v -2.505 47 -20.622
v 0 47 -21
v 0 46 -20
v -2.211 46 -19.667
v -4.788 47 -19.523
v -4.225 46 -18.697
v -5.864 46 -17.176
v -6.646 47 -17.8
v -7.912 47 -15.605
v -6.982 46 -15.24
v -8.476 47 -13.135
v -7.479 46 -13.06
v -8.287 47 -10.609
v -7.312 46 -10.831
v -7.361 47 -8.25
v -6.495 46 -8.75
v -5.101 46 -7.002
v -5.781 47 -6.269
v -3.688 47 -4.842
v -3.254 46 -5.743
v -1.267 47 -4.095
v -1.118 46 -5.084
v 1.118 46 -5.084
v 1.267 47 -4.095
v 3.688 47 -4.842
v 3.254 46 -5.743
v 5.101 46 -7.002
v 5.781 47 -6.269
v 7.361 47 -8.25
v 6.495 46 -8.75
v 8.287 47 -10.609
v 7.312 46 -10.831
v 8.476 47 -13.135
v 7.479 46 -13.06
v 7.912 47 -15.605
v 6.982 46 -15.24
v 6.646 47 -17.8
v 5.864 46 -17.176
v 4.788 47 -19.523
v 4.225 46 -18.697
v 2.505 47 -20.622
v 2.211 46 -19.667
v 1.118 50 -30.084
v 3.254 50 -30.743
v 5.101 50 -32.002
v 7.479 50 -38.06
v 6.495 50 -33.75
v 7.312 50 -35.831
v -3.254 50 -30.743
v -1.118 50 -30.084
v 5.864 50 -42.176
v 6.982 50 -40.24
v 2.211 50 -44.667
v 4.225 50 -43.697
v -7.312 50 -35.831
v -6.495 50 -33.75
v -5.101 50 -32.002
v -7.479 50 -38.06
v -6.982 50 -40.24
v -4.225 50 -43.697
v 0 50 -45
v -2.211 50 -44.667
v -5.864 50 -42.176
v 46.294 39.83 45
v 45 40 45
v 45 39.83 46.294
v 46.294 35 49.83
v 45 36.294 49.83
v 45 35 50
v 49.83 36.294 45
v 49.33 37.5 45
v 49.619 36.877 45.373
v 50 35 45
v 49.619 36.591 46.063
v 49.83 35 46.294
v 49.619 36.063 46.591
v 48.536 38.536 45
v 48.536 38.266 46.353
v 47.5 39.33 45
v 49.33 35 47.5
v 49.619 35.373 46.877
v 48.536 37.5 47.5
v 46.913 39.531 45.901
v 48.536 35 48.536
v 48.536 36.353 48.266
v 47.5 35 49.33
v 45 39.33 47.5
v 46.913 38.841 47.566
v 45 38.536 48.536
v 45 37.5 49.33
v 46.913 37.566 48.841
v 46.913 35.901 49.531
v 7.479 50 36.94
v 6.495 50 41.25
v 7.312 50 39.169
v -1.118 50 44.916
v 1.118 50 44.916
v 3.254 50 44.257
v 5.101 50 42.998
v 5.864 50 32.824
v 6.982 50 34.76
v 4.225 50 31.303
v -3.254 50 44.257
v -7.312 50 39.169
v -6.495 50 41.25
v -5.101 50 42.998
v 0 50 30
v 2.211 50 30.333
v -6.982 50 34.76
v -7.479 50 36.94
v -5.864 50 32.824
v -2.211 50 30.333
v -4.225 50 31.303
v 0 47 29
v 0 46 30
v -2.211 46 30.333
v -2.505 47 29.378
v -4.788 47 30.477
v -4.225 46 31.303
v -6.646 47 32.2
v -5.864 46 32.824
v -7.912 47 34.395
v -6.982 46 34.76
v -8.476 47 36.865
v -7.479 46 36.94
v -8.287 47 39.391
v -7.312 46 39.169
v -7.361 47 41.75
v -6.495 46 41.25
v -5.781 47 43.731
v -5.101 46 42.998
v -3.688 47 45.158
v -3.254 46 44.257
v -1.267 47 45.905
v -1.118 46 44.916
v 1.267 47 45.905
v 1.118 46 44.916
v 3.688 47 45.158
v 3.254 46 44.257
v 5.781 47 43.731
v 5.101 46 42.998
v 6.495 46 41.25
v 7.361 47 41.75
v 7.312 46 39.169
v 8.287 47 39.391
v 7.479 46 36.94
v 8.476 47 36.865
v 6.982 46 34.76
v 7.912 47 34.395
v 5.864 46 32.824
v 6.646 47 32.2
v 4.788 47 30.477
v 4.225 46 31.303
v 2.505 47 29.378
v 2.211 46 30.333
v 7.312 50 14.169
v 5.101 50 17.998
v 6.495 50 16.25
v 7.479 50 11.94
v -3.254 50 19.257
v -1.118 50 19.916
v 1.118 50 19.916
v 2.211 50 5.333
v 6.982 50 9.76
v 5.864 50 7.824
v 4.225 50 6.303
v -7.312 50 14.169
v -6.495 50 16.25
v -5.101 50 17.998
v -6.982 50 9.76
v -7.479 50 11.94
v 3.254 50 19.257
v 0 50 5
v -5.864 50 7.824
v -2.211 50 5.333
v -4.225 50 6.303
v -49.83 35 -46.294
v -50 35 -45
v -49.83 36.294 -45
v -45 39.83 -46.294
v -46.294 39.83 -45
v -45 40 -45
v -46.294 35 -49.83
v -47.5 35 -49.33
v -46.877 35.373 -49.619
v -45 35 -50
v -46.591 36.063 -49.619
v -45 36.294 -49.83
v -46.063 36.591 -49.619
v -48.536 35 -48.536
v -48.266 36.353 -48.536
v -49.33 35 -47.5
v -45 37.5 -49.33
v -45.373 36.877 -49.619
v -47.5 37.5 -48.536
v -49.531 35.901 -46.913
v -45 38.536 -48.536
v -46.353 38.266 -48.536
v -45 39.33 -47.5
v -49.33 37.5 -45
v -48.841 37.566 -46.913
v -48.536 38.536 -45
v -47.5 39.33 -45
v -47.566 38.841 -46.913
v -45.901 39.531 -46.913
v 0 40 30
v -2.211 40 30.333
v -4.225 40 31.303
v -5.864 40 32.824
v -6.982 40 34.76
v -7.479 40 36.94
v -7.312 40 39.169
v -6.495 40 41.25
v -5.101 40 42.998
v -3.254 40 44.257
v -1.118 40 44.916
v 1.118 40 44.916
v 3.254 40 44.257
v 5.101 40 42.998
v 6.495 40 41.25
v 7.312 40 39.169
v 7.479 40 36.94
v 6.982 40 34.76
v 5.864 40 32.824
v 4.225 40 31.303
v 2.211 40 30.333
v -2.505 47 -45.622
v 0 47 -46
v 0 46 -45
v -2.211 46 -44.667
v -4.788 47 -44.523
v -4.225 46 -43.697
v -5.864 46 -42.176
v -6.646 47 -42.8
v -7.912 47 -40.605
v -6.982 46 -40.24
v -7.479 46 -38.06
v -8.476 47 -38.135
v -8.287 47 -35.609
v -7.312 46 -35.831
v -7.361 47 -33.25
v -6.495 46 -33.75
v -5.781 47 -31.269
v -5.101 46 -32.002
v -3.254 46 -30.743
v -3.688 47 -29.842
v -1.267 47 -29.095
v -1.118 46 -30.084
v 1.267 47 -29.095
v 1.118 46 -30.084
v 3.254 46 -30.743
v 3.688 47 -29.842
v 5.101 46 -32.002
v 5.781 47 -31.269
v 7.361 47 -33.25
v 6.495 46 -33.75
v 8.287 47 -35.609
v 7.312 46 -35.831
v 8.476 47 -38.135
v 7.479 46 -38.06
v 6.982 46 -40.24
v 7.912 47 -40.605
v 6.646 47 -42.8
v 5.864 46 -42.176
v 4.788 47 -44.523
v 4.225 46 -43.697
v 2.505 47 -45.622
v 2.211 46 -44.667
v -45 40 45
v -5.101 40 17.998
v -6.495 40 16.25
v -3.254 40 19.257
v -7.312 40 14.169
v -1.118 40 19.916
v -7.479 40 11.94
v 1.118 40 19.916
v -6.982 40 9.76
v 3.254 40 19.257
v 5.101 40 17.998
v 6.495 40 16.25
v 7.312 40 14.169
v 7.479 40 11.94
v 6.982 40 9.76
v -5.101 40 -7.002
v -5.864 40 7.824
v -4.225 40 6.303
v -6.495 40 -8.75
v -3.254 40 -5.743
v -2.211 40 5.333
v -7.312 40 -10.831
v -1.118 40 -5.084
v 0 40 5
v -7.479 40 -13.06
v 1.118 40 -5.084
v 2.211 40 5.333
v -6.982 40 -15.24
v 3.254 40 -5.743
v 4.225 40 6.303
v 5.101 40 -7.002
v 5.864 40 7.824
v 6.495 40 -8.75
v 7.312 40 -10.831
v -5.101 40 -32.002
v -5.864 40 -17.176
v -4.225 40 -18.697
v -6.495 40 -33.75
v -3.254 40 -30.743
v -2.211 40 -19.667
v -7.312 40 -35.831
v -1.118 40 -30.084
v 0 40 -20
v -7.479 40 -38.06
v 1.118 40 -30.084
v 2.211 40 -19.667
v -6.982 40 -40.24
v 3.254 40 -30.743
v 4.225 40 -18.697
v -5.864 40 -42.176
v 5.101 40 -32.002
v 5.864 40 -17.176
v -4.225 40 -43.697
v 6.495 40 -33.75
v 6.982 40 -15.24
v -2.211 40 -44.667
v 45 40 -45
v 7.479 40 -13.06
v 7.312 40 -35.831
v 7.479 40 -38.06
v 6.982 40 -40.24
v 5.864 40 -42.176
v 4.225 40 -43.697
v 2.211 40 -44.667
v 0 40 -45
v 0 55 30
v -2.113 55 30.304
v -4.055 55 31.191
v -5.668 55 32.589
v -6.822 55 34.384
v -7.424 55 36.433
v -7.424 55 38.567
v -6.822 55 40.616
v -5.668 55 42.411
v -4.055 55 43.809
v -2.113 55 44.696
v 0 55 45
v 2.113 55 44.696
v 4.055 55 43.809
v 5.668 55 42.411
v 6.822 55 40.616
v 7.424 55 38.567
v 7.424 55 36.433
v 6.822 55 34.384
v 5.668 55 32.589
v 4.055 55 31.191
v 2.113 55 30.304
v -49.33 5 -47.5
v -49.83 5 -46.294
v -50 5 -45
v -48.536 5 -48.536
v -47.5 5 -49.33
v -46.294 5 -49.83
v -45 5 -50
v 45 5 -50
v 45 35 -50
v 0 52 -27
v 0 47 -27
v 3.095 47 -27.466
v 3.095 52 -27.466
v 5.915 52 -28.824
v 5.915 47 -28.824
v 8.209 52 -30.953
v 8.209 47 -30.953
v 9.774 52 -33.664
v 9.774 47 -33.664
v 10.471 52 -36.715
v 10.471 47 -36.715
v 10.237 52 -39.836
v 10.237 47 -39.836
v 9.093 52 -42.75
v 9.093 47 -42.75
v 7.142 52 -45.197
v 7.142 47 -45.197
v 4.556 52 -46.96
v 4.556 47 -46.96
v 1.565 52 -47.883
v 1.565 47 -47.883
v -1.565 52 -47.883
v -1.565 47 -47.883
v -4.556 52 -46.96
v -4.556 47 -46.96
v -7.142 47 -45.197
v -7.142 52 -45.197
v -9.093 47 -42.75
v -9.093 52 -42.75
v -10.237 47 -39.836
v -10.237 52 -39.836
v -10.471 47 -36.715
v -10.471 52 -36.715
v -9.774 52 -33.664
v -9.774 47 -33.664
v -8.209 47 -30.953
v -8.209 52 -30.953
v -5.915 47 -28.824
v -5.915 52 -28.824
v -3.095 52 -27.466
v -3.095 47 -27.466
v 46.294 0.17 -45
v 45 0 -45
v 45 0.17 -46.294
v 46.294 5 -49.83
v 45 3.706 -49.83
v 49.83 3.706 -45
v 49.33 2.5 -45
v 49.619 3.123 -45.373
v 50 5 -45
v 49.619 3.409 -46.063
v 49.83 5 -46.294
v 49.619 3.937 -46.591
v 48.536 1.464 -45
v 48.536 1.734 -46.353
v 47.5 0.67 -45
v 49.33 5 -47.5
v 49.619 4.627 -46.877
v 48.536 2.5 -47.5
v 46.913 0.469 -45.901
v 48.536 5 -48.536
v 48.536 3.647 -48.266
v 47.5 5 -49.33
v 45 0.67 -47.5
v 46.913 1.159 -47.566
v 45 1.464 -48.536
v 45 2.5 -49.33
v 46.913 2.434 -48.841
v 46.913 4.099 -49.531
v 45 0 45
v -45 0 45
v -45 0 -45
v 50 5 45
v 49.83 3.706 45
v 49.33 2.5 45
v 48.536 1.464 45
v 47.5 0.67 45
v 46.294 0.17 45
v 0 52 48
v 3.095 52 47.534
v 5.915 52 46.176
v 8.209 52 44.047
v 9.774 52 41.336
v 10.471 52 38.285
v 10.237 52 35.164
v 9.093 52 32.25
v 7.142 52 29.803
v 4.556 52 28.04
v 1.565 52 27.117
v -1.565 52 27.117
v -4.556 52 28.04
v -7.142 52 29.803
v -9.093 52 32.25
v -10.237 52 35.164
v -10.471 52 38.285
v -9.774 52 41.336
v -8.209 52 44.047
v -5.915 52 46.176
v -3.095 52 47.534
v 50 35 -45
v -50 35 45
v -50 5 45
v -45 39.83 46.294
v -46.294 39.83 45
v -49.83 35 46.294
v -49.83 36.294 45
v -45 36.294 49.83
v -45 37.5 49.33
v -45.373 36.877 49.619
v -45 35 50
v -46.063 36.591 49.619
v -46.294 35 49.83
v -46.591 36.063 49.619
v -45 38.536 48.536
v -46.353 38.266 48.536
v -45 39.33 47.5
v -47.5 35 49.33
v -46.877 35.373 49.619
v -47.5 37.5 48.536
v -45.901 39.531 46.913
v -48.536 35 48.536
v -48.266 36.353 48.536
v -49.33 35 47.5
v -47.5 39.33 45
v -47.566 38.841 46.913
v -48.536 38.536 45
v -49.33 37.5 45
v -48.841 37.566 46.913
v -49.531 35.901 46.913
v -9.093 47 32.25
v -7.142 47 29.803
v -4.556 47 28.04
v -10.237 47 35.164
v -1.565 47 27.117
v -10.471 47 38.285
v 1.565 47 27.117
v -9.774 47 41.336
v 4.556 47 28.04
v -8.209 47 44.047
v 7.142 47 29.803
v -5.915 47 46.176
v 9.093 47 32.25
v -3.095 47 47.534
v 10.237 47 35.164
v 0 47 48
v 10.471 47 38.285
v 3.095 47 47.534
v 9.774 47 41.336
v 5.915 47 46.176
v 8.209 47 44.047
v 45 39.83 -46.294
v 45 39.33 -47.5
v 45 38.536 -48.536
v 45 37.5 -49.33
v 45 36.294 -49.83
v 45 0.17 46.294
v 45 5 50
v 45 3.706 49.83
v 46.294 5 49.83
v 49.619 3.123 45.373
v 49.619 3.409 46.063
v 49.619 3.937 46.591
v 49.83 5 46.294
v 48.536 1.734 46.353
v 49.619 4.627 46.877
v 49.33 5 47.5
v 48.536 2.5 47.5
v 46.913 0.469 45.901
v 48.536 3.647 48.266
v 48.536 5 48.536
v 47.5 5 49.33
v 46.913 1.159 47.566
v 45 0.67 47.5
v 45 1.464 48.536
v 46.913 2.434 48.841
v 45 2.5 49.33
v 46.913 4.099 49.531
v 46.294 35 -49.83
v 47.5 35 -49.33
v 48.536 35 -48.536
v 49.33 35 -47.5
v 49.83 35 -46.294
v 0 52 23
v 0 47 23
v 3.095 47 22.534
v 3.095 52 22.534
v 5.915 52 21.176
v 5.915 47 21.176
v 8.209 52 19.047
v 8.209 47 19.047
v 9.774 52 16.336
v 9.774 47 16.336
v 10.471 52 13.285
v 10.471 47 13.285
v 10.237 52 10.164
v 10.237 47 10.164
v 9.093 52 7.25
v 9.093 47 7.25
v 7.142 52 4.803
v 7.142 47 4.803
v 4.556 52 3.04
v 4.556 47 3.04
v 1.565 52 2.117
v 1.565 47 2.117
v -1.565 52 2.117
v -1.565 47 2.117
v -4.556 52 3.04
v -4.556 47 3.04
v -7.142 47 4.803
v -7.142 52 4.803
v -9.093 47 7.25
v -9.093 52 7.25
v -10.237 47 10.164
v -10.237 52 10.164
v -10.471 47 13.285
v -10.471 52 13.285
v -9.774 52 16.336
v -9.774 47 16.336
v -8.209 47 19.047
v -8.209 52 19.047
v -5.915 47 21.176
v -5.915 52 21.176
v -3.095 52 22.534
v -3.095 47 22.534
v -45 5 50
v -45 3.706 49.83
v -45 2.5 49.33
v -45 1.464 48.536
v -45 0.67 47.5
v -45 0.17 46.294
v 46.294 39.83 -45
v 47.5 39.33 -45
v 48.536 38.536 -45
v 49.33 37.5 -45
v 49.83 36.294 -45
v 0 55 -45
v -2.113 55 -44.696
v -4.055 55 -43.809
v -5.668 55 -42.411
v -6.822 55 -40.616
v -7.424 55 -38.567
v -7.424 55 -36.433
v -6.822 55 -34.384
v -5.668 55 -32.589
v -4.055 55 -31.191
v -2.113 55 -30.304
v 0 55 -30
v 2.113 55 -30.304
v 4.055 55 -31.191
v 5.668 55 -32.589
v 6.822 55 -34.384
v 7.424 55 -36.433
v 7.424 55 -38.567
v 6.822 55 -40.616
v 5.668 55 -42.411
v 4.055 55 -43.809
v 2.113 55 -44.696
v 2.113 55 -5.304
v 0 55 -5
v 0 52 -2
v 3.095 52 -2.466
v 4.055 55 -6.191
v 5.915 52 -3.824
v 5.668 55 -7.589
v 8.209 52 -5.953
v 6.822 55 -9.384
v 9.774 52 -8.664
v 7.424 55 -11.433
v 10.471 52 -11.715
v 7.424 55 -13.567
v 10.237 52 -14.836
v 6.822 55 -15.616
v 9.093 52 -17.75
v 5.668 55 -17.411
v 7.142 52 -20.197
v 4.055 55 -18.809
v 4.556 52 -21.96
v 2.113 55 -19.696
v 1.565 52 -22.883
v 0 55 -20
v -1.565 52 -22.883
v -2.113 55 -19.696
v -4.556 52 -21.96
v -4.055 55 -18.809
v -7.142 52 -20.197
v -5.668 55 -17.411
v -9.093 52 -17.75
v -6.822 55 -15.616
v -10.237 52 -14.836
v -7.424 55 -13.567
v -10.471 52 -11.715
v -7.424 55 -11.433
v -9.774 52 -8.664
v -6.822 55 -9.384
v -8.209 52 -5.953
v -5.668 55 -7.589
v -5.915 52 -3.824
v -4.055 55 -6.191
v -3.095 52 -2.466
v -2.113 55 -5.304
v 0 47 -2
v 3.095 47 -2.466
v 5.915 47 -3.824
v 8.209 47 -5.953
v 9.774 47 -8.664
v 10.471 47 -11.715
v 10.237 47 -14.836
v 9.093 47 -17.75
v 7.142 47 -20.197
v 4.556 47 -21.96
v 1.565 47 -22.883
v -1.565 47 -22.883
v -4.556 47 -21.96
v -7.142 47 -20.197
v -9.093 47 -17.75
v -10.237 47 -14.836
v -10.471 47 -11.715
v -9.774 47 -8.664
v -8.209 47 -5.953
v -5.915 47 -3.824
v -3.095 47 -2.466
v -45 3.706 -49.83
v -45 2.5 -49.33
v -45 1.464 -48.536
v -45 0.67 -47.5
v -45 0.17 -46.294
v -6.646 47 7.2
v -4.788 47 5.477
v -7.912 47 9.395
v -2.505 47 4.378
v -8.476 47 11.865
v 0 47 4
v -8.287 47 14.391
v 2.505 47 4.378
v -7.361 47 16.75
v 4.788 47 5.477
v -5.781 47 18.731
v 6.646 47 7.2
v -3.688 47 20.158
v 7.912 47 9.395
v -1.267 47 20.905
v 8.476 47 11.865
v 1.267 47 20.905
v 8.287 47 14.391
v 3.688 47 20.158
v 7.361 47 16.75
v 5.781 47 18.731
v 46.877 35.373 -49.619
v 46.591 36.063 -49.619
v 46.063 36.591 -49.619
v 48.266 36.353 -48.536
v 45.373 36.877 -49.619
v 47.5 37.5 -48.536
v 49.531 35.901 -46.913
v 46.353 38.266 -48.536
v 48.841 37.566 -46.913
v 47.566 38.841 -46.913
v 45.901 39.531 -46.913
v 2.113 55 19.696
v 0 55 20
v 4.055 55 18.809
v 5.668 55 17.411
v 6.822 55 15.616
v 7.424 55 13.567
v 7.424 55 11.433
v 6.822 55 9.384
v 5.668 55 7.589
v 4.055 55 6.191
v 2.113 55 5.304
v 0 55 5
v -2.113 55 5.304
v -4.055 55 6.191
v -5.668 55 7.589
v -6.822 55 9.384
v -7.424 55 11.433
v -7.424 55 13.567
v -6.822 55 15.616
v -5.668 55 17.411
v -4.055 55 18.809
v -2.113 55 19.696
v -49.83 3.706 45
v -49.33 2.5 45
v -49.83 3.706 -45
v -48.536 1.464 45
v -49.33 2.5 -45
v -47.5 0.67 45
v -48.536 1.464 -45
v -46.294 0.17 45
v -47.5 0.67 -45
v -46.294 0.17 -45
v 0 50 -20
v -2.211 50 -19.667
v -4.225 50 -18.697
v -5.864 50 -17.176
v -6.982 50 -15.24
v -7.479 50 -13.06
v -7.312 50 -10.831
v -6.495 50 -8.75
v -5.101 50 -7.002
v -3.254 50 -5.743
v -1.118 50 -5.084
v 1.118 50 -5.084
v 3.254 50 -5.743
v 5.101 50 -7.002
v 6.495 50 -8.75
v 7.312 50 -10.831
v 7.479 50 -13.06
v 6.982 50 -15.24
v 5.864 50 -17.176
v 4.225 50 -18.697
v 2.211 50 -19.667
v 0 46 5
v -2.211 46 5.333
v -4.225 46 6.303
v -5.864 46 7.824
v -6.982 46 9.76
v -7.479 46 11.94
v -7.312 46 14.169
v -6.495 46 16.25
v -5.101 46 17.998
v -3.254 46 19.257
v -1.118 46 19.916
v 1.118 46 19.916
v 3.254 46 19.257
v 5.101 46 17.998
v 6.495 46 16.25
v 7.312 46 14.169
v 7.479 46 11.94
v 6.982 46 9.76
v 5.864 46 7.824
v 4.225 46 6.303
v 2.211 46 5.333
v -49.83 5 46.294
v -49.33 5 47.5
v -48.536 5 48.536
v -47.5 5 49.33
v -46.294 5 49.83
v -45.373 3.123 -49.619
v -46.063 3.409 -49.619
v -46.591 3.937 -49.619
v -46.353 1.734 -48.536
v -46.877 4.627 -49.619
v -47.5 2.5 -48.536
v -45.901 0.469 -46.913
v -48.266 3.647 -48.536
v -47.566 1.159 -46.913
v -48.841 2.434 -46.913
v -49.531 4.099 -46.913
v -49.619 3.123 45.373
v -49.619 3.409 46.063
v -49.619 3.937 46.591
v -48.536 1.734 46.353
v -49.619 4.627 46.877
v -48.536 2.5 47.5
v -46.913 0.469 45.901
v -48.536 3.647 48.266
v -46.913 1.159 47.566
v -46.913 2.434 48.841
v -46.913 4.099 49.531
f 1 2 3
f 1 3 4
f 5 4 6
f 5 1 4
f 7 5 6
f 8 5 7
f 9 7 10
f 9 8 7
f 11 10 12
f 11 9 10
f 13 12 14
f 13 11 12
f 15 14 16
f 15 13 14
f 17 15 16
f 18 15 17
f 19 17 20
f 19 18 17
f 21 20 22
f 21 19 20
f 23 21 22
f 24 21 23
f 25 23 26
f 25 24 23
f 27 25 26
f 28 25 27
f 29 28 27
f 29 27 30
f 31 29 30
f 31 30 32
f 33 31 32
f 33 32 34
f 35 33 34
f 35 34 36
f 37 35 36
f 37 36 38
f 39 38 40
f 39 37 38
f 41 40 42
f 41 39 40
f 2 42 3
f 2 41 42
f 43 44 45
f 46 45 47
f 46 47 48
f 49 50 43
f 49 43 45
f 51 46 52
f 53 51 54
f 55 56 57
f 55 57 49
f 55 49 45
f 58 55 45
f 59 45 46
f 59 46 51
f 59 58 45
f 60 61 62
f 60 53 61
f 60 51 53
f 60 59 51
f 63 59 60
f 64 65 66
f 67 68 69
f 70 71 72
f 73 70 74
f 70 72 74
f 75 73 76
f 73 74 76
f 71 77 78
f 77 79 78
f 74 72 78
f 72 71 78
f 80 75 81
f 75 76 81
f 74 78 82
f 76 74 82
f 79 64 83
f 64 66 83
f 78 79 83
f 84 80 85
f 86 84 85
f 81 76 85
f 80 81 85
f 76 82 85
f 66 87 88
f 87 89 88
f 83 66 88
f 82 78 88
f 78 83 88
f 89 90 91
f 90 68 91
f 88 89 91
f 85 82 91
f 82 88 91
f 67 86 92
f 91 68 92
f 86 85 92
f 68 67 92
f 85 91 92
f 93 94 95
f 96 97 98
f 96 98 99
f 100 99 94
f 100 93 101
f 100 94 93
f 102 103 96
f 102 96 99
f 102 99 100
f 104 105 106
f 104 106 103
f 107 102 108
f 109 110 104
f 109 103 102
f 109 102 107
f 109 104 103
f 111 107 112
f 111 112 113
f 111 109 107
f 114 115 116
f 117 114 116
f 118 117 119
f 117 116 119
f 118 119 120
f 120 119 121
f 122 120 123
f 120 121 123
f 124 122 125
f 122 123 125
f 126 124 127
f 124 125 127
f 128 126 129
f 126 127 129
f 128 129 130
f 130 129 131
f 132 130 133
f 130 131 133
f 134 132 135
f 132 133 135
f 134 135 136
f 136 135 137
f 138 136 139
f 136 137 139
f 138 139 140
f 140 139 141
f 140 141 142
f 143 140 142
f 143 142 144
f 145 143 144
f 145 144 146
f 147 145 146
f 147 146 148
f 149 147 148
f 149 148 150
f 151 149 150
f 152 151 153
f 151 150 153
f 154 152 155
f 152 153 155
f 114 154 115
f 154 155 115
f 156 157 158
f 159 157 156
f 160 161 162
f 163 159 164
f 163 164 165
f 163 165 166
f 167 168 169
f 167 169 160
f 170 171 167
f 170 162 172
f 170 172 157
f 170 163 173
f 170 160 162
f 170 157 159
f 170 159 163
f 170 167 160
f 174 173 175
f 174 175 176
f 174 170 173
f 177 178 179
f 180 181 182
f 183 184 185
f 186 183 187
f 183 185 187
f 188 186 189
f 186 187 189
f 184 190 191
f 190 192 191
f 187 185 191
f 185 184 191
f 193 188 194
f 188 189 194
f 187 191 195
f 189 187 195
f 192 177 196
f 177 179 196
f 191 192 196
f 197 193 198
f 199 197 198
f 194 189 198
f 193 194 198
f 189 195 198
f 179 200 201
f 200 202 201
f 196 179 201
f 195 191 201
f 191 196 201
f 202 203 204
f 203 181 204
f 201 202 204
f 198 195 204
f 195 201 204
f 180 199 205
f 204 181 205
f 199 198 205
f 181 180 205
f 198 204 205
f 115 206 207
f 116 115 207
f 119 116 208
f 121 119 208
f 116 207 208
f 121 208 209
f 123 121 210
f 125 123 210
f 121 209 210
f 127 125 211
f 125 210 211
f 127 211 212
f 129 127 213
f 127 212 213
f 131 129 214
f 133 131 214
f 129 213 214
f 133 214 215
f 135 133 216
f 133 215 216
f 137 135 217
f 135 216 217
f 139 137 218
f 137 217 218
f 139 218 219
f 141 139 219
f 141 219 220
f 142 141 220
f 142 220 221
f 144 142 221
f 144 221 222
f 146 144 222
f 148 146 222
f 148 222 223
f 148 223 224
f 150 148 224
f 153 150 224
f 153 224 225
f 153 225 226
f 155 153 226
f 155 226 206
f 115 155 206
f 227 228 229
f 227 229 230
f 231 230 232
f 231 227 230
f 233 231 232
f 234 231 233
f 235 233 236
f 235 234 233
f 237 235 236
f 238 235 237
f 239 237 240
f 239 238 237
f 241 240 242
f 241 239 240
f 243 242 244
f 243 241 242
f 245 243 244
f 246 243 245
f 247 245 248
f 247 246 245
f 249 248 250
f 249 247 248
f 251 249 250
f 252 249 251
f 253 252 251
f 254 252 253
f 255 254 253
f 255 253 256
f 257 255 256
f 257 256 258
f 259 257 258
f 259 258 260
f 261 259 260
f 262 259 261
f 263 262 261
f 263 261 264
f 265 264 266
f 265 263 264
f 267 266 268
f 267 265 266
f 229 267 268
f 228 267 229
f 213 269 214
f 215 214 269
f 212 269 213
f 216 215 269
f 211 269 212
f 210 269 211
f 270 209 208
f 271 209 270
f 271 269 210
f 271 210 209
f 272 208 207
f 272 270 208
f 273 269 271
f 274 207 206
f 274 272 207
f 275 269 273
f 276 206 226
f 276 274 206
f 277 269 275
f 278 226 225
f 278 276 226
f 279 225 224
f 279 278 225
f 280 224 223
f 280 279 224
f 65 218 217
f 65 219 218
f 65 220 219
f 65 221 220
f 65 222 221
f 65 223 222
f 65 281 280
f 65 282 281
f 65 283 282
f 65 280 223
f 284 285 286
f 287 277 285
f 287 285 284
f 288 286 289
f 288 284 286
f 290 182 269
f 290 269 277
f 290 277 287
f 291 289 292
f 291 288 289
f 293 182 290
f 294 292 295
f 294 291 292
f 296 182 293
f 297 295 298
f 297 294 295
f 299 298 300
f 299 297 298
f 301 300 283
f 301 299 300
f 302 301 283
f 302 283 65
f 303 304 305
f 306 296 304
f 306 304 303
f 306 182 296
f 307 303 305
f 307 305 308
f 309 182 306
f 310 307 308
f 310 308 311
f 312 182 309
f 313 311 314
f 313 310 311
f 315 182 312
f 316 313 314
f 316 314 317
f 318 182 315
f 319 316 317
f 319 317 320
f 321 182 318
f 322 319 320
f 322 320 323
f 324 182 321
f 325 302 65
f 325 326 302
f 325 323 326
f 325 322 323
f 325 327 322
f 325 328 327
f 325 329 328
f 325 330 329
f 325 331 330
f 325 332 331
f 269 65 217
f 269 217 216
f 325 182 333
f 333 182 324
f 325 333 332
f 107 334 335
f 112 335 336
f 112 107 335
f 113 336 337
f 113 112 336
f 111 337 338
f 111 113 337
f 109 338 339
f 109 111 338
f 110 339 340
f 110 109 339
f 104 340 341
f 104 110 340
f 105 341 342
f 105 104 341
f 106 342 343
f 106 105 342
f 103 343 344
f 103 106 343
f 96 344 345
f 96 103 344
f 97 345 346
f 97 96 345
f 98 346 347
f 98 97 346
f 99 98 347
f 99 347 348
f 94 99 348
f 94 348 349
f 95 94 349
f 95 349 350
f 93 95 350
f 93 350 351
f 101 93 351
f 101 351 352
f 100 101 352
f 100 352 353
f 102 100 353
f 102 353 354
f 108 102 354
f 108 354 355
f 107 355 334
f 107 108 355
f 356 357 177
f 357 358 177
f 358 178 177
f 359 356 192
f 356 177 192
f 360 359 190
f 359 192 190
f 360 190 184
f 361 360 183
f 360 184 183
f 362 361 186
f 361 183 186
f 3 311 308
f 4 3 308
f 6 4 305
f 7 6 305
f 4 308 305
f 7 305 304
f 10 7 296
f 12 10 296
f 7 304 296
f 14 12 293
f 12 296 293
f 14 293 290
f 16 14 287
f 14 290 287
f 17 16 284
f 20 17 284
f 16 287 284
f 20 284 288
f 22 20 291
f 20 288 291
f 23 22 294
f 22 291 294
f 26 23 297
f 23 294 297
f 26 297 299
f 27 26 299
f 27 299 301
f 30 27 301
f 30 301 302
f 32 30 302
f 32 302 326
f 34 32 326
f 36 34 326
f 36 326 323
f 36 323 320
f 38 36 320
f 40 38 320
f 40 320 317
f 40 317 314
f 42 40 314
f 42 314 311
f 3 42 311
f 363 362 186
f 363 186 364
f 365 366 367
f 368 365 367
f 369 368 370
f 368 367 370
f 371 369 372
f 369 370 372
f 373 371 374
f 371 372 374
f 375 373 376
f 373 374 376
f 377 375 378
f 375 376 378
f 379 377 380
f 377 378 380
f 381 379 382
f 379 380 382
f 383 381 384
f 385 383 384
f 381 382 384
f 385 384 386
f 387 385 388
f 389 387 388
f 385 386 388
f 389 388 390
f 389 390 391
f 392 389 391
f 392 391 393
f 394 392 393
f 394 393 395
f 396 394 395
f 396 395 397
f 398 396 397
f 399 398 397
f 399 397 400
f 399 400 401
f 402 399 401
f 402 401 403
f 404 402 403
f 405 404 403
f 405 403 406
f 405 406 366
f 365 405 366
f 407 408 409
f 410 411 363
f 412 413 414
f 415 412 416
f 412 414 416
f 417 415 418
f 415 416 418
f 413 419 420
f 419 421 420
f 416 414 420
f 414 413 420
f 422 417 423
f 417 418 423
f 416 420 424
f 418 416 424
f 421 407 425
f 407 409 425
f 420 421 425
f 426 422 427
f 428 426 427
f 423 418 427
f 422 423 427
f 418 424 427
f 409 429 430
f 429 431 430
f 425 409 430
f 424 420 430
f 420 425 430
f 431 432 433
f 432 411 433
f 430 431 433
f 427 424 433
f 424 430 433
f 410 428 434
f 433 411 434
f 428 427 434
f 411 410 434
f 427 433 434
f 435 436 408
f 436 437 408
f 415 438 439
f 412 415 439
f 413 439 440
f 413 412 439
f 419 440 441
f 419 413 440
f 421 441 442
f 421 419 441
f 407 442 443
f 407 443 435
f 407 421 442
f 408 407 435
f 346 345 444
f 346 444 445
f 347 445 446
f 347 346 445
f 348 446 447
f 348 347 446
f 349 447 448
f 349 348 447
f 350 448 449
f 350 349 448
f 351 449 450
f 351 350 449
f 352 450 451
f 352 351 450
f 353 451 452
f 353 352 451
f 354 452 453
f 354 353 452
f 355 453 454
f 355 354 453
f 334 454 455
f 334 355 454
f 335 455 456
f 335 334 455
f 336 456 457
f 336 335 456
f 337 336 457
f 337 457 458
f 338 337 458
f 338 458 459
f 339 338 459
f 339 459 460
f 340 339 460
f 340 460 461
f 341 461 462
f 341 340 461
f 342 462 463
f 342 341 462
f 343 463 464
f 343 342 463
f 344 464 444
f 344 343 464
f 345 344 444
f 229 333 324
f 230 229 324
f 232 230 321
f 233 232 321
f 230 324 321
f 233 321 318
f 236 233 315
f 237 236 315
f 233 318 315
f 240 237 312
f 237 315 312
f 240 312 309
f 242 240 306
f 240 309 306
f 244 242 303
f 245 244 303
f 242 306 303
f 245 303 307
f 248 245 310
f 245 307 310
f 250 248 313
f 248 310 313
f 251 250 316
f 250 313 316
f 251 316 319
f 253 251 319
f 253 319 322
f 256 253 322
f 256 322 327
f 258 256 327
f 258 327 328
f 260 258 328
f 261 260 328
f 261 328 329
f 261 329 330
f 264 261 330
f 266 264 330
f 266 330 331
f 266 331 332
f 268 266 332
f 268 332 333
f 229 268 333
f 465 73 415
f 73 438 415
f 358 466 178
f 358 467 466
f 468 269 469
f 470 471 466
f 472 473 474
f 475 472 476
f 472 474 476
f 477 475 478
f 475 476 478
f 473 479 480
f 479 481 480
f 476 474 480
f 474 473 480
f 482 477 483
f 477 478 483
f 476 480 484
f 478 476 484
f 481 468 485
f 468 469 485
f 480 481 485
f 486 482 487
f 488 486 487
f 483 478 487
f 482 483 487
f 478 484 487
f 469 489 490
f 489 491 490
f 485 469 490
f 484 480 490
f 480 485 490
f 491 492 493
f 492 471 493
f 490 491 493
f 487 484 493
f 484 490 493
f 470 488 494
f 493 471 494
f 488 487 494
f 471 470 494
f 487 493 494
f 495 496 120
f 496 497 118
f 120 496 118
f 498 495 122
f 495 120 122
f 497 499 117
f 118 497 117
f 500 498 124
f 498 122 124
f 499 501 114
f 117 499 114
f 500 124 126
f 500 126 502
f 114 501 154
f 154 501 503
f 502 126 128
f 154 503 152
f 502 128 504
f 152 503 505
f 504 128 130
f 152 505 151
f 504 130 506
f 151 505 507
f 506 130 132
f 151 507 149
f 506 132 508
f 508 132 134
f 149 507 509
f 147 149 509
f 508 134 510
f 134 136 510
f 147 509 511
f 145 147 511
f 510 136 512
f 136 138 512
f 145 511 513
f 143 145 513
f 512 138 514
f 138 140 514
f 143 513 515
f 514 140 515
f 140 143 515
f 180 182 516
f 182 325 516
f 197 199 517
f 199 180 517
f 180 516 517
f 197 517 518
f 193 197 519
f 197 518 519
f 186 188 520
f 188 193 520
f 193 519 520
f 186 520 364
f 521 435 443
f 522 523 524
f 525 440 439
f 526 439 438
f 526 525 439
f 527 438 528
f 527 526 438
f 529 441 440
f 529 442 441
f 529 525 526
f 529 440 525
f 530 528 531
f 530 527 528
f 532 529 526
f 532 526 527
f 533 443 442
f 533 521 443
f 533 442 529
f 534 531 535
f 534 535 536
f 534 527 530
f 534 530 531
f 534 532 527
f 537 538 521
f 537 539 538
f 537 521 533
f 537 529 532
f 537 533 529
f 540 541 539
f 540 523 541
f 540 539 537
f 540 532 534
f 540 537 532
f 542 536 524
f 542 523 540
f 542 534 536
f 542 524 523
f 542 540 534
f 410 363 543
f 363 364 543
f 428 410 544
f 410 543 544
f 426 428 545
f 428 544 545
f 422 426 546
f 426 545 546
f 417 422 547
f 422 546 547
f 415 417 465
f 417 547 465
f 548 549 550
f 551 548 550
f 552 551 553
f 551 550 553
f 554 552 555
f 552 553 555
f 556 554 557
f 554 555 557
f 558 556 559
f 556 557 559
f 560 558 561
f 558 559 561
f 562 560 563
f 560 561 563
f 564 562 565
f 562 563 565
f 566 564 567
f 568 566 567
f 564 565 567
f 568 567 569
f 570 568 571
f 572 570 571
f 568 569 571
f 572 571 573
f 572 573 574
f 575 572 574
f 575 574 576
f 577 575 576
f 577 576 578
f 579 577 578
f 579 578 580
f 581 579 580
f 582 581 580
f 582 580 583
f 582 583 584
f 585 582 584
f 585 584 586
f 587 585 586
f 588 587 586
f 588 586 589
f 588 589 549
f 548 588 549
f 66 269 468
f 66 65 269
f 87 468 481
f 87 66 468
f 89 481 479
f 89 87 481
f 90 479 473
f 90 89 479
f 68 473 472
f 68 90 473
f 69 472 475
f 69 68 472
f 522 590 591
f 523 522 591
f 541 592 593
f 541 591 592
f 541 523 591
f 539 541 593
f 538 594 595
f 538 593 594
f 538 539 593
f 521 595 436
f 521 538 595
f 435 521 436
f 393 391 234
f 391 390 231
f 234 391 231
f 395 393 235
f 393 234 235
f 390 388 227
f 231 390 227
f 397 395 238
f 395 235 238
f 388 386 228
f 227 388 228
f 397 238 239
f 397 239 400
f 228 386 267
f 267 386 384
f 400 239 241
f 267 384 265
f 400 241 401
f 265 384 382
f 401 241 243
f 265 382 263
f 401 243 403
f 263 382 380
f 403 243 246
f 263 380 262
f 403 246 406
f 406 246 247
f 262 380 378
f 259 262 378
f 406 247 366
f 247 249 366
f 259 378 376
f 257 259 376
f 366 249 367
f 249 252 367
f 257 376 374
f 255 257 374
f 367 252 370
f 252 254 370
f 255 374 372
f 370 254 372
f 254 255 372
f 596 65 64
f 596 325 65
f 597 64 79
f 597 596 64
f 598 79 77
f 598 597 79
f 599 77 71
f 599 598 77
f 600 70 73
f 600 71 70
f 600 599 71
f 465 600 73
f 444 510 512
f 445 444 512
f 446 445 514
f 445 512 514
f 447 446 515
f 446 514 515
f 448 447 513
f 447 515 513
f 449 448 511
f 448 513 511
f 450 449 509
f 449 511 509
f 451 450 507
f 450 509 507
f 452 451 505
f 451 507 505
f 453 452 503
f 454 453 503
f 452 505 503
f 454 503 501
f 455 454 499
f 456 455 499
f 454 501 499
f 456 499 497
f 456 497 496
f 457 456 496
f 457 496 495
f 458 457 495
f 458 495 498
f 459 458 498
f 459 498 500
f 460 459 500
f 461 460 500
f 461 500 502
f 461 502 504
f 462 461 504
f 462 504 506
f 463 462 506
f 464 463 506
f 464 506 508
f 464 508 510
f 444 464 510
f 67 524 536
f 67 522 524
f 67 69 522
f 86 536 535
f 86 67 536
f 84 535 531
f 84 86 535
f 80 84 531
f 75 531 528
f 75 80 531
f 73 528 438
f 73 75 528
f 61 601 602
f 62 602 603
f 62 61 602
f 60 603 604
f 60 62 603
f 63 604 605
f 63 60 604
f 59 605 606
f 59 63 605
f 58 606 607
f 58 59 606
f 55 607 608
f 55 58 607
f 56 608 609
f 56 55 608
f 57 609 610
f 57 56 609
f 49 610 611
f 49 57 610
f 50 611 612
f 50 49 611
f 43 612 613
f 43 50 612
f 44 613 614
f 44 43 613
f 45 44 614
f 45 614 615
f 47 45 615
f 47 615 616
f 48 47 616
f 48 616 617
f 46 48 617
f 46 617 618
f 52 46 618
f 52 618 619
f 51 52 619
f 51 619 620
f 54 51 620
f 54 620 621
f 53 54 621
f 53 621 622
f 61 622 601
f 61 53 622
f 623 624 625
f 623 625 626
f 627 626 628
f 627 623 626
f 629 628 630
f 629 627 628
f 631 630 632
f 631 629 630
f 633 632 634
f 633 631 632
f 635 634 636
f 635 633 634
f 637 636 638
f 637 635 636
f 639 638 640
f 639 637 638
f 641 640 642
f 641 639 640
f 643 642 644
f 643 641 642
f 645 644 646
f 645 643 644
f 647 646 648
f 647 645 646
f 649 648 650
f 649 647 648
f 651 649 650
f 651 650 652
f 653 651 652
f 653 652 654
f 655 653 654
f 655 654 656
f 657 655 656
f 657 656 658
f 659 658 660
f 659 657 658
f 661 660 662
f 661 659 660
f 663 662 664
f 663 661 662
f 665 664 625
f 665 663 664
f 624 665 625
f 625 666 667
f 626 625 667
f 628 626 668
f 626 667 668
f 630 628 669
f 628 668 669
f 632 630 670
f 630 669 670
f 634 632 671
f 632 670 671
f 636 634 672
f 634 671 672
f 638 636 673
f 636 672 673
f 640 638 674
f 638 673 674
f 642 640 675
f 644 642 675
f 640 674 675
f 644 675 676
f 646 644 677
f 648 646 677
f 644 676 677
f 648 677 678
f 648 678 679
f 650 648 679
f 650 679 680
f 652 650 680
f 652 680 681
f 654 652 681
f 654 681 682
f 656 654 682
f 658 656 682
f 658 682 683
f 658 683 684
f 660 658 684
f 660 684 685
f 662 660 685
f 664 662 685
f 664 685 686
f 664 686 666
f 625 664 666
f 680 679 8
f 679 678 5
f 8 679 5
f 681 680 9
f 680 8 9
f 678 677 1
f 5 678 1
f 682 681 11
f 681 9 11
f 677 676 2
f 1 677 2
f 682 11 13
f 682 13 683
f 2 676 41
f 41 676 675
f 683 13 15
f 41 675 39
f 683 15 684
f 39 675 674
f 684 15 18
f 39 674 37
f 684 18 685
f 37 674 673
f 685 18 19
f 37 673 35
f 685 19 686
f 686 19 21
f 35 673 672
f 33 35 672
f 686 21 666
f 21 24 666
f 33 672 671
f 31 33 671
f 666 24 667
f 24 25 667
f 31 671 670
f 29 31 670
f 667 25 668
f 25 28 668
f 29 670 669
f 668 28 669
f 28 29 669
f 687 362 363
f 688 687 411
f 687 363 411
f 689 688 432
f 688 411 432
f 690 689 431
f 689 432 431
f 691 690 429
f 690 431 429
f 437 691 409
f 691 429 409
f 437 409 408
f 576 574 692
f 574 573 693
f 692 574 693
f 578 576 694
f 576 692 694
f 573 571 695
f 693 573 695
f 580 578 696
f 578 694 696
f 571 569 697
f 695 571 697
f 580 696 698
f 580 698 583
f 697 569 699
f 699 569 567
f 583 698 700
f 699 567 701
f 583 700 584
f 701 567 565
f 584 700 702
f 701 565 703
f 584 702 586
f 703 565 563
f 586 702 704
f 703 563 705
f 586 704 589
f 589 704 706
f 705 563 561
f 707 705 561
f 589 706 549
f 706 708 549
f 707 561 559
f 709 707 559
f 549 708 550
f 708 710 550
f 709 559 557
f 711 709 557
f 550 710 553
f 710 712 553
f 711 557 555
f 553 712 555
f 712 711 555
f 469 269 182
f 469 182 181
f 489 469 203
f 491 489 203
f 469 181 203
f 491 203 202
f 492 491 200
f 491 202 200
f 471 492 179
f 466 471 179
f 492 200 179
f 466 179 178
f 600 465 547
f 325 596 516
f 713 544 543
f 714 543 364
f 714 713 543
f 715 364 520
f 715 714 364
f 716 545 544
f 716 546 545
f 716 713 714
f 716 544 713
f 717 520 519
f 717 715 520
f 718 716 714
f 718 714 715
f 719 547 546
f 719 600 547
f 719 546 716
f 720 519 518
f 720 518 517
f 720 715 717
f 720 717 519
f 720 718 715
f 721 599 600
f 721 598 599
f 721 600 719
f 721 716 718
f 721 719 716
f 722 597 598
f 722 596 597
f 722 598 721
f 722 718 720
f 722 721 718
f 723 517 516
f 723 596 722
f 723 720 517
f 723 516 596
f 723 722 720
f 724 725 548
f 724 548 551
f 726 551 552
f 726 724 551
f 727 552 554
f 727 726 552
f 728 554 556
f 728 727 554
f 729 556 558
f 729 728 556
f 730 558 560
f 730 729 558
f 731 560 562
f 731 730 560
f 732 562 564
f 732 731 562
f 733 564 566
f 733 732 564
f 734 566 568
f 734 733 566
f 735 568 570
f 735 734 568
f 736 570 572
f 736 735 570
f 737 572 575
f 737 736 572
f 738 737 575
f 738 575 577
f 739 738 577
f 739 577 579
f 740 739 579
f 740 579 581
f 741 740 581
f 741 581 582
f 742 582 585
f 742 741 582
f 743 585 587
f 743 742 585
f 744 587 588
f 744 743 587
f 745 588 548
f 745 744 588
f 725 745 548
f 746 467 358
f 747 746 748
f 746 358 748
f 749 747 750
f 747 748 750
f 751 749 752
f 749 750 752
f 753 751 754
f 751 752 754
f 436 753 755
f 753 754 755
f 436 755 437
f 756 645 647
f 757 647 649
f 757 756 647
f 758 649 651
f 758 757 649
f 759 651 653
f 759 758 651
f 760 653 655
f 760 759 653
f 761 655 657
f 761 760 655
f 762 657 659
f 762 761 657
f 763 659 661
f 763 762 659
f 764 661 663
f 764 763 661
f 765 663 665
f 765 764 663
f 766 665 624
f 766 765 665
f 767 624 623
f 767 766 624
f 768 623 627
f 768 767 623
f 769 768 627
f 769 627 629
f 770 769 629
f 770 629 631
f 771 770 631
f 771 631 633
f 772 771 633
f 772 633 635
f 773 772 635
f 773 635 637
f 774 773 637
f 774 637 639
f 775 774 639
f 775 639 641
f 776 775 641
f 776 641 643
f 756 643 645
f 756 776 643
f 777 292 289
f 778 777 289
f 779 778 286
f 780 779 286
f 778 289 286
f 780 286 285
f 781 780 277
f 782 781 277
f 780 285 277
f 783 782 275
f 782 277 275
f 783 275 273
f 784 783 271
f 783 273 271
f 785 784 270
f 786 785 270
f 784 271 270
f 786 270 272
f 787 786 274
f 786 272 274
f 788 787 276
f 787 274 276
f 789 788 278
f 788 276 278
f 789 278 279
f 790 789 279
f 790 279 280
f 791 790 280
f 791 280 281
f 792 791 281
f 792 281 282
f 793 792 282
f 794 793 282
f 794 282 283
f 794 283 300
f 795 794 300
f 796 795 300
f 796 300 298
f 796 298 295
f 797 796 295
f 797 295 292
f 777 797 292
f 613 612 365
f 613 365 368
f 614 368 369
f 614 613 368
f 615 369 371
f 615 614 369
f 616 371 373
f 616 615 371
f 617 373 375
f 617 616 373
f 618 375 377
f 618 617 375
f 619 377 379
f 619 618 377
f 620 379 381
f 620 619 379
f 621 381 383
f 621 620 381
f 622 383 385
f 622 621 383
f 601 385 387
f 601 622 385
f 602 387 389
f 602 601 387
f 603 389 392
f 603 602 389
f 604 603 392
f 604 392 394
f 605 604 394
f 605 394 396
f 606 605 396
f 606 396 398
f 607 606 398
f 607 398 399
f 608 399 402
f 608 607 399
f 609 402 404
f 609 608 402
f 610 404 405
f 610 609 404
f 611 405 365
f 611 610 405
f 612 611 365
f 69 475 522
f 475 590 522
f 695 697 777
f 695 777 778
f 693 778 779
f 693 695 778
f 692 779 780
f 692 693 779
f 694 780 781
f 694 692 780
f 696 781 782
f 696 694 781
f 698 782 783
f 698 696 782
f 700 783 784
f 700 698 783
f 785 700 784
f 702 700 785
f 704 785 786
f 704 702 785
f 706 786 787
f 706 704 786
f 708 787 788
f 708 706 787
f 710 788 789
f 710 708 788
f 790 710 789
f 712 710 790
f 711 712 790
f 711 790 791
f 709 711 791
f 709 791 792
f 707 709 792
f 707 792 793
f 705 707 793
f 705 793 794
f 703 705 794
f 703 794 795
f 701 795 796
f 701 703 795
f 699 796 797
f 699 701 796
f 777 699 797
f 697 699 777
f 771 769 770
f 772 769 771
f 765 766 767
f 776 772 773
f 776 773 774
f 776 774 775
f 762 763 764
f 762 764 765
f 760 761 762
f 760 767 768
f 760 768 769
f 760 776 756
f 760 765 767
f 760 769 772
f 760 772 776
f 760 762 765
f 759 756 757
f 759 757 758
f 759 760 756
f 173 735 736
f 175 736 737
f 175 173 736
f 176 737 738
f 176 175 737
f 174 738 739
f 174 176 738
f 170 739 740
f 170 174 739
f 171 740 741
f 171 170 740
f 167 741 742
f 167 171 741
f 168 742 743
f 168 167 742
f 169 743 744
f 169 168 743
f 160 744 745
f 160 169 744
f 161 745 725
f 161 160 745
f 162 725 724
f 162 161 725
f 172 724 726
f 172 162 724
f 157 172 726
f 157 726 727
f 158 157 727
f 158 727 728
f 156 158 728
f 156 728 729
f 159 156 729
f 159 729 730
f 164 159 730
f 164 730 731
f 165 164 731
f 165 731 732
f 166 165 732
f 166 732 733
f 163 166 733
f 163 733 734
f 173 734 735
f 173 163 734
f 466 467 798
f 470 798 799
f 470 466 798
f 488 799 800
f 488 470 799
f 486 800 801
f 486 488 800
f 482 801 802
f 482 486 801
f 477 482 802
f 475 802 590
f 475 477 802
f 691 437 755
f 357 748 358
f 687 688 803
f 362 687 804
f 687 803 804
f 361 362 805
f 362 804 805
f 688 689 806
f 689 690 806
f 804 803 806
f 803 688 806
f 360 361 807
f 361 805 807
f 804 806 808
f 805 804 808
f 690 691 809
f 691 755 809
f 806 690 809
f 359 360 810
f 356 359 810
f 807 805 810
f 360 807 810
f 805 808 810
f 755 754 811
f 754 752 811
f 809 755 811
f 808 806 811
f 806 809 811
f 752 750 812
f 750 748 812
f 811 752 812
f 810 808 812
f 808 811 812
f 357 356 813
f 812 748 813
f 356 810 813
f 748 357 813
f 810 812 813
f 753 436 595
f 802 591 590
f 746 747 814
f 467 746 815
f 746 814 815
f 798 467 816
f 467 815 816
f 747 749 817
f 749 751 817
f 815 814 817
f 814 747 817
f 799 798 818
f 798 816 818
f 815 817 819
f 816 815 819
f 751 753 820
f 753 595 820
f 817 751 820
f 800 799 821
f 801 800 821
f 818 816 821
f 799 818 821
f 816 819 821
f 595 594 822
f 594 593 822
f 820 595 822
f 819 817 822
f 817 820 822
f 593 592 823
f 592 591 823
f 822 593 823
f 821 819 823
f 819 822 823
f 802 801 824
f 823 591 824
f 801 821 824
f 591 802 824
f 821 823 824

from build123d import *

# Parameters (mm, degrees)
SKETCH1_W           = 100
SKETCH1_H           = 100
BOSS_EXTRUDE1_DEPTH = 40
SKETCH2_R           = 7.5
BOSS_EXTRUDE2_DEPTH = 10
BOSS_EXTRUDE3_START = 7
SKETCH2_4_R         = 10.5
SKETCH2_4_R_2       = 7.5
BOSS_EXTRUDE3_DEPTH = 10
CHAMFER1_SIZE       = 1
CHAMFER2_SIZE       = 5
FILLET1_R           = 5


# Some blends are built 0.0001 mm under size
with BuildPart() as part:
    # Sketch1 → Boss-Extrude1 (new body)
    with BuildSketch(Plane(origin=(0, 0, 0), x_dir=(1, 0, 0), z_dir=(0, 1, 0))):
        Rectangle(SKETCH1_W, SKETCH1_H)
    extrude(amount=BOSS_EXTRUDE1_DEPTH)

    # Sketch2 → Boss-Extrude2 (add)
    with BuildSketch(Plane(origin=(0, 40, 0), x_dir=(1, 0, 0), z_dir=(0, 1, 0))):
        with Locations(Location((0, -37.5, 0), (0, 0, 90))):
            Circle(SKETCH2_R)
        with Locations(Location((0, -12.5, 0), (0, 0, 90))):
            Circle(SKETCH2_R)
        with Locations(Location((0, 12.5, 0), (0, 0, 90))):
            Circle(SKETCH2_R)
        with Locations(Location((0, 37.5, 0), (0, 0, 90))):
            Circle(SKETCH2_R)
    extrude(amount=BOSS_EXTRUDE2_DEPTH)

    # Sketch2<4> → Boss-Extrude3 (add)
    # profile 1 of 4: a face of its own
    with BuildSketch(Plane(origin=(0, 40, 0), x_dir=(1, 0, 0), z_dir=(0, 1, 0)).offset(BOSS_EXTRUDE3_START)):
        with Locations(Location((0, -37.5, 0), (0, 0, 270))):
            Circle(SKETCH2_4_R)
        with Locations(Location((0, -37.5, 0), (0, 0, 90))):
            Circle(SKETCH2_4_R_2, mode=Mode.SUBTRACT)
    # profile 2 of 4: a face of its own
    with BuildSketch(Plane(origin=(0, 40, 0), x_dir=(1, 0, 0), z_dir=(0, 1, 0)).offset(BOSS_EXTRUDE3_START)):
        with Locations(Location((0, -12.5, 0), (0, 0, 270))):
            Circle(SKETCH2_4_R)
        with Locations(Location((0, -12.5, 0), (0, 0, 90))):
            Circle(SKETCH2_4_R_2, mode=Mode.SUBTRACT)
    # profile 3 of 4: a face of its own
    with BuildSketch(Plane(origin=(0, 40, 0), x_dir=(1, 0, 0), z_dir=(0, 1, 0)).offset(BOSS_EXTRUDE3_START)):
        with Locations(Location((0, 12.5, 0), (0, 0, 270))):
            Circle(SKETCH2_4_R)
        with Locations(Location((0, 12.5, 0), (0, 0, 90))):
            Circle(SKETCH2_4_R_2, mode=Mode.SUBTRACT)
    # profile 4 of 4: a face of its own
    with BuildSketch(Plane(origin=(0, 40, 0), x_dir=(1, 0, 0), z_dir=(0, 1, 0)).offset(BOSS_EXTRUDE3_START)):
        with Locations(Location((0, 37.5, 0), (0, 0, 270))):
            Circle(SKETCH2_4_R)
        with Locations(Location((0, 37.5, 0), (0, 0, 90))):
            Circle(SKETCH2_4_R_2, mode=Mode.SUBTRACT)
    extrude(amount=BOSS_EXTRUDE3_DEPTH)

    # Chamfer1
    chamfer1_edges = [part.edges().sort_by_distance(p)[0] for p in [
        (0, 47, 45),
        (0, 47, 20),
        (0, 47, -5),
        (0, 47, -30),
    ]]
    chamfer(chamfer1_edges, length=CHAMFER1_SIZE)

    # Chamfer2
    # the kernel refuses this chamfer: 5 mm, written as the material it takes off along each edge
    with BuildSketch(Plane(origin=(0, 57, -37.5), x_dir=(0, 0, 1), z_dir=(-1, 0, 0))) as chamfer2_piece_1:
        Polygon((10.5, -CHAMFER2_SIZE), (10.5 - CHAMFER2_SIZE, 0), (10.5, 0), align=None)
    revolve(axis=Axis((0, 57, -37.5), (0, 1, 0)), mode=Mode.SUBTRACT)
    with BuildSketch(Plane(origin=(0, 57, -12.5), x_dir=(0, 0, 1), z_dir=(-1, 0, 0))) as chamfer2_piece_2:
        Polygon((10.5, -CHAMFER2_SIZE), (10.5 - CHAMFER2_SIZE, 0), (10.5, 0), align=None)
    revolve(axis=Axis((0, 57, -12.5), (0, 1, 0)), mode=Mode.SUBTRACT)
    with BuildSketch(Plane(origin=(0, 57, 12.5), x_dir=(0, 0, 1), z_dir=(-1, 0, 0))) as chamfer2_piece_3:
        Polygon((10.5, -CHAMFER2_SIZE), (10.5 - CHAMFER2_SIZE, 0), (10.5, 0), align=None)
    revolve(axis=Axis((0, 57, 12.5), (0, 1, 0)), mode=Mode.SUBTRACT)
    with BuildSketch(Plane(origin=(0, 57, 37.5), x_dir=(0, 0, 1), z_dir=(-1, 0, 0))) as chamfer2_piece_4:
        Polygon((10.5, -CHAMFER2_SIZE), (10.5 - CHAMFER2_SIZE, 0), (10.5, 0), align=None)
    revolve(axis=Axis((0, 57, 37.5), (0, 1, 0)), mode=Mode.SUBTRACT)

    # Fillet1
    fillet1_edges = [part.edges().sort_by_distance(p)[0] for p in [
        (-50, 40, 0),
        (0, 40, 50),
        (50, 40, 0),
        (0, 0, 50),
        (-50, 0, 0),
        (0, 0, -50),
        (50, 0, 0),
        (50, 20, 50),
        (-50, 20, 50),
        (-50, 20, -50),
        (50, 20, -50),
        (0, 40, -50),
    ]]
    fillet(fillet1_edges, radius=FILLET1_R - 0.0001)  # a hair under: the kernel refuses the full size


solid = part.part
